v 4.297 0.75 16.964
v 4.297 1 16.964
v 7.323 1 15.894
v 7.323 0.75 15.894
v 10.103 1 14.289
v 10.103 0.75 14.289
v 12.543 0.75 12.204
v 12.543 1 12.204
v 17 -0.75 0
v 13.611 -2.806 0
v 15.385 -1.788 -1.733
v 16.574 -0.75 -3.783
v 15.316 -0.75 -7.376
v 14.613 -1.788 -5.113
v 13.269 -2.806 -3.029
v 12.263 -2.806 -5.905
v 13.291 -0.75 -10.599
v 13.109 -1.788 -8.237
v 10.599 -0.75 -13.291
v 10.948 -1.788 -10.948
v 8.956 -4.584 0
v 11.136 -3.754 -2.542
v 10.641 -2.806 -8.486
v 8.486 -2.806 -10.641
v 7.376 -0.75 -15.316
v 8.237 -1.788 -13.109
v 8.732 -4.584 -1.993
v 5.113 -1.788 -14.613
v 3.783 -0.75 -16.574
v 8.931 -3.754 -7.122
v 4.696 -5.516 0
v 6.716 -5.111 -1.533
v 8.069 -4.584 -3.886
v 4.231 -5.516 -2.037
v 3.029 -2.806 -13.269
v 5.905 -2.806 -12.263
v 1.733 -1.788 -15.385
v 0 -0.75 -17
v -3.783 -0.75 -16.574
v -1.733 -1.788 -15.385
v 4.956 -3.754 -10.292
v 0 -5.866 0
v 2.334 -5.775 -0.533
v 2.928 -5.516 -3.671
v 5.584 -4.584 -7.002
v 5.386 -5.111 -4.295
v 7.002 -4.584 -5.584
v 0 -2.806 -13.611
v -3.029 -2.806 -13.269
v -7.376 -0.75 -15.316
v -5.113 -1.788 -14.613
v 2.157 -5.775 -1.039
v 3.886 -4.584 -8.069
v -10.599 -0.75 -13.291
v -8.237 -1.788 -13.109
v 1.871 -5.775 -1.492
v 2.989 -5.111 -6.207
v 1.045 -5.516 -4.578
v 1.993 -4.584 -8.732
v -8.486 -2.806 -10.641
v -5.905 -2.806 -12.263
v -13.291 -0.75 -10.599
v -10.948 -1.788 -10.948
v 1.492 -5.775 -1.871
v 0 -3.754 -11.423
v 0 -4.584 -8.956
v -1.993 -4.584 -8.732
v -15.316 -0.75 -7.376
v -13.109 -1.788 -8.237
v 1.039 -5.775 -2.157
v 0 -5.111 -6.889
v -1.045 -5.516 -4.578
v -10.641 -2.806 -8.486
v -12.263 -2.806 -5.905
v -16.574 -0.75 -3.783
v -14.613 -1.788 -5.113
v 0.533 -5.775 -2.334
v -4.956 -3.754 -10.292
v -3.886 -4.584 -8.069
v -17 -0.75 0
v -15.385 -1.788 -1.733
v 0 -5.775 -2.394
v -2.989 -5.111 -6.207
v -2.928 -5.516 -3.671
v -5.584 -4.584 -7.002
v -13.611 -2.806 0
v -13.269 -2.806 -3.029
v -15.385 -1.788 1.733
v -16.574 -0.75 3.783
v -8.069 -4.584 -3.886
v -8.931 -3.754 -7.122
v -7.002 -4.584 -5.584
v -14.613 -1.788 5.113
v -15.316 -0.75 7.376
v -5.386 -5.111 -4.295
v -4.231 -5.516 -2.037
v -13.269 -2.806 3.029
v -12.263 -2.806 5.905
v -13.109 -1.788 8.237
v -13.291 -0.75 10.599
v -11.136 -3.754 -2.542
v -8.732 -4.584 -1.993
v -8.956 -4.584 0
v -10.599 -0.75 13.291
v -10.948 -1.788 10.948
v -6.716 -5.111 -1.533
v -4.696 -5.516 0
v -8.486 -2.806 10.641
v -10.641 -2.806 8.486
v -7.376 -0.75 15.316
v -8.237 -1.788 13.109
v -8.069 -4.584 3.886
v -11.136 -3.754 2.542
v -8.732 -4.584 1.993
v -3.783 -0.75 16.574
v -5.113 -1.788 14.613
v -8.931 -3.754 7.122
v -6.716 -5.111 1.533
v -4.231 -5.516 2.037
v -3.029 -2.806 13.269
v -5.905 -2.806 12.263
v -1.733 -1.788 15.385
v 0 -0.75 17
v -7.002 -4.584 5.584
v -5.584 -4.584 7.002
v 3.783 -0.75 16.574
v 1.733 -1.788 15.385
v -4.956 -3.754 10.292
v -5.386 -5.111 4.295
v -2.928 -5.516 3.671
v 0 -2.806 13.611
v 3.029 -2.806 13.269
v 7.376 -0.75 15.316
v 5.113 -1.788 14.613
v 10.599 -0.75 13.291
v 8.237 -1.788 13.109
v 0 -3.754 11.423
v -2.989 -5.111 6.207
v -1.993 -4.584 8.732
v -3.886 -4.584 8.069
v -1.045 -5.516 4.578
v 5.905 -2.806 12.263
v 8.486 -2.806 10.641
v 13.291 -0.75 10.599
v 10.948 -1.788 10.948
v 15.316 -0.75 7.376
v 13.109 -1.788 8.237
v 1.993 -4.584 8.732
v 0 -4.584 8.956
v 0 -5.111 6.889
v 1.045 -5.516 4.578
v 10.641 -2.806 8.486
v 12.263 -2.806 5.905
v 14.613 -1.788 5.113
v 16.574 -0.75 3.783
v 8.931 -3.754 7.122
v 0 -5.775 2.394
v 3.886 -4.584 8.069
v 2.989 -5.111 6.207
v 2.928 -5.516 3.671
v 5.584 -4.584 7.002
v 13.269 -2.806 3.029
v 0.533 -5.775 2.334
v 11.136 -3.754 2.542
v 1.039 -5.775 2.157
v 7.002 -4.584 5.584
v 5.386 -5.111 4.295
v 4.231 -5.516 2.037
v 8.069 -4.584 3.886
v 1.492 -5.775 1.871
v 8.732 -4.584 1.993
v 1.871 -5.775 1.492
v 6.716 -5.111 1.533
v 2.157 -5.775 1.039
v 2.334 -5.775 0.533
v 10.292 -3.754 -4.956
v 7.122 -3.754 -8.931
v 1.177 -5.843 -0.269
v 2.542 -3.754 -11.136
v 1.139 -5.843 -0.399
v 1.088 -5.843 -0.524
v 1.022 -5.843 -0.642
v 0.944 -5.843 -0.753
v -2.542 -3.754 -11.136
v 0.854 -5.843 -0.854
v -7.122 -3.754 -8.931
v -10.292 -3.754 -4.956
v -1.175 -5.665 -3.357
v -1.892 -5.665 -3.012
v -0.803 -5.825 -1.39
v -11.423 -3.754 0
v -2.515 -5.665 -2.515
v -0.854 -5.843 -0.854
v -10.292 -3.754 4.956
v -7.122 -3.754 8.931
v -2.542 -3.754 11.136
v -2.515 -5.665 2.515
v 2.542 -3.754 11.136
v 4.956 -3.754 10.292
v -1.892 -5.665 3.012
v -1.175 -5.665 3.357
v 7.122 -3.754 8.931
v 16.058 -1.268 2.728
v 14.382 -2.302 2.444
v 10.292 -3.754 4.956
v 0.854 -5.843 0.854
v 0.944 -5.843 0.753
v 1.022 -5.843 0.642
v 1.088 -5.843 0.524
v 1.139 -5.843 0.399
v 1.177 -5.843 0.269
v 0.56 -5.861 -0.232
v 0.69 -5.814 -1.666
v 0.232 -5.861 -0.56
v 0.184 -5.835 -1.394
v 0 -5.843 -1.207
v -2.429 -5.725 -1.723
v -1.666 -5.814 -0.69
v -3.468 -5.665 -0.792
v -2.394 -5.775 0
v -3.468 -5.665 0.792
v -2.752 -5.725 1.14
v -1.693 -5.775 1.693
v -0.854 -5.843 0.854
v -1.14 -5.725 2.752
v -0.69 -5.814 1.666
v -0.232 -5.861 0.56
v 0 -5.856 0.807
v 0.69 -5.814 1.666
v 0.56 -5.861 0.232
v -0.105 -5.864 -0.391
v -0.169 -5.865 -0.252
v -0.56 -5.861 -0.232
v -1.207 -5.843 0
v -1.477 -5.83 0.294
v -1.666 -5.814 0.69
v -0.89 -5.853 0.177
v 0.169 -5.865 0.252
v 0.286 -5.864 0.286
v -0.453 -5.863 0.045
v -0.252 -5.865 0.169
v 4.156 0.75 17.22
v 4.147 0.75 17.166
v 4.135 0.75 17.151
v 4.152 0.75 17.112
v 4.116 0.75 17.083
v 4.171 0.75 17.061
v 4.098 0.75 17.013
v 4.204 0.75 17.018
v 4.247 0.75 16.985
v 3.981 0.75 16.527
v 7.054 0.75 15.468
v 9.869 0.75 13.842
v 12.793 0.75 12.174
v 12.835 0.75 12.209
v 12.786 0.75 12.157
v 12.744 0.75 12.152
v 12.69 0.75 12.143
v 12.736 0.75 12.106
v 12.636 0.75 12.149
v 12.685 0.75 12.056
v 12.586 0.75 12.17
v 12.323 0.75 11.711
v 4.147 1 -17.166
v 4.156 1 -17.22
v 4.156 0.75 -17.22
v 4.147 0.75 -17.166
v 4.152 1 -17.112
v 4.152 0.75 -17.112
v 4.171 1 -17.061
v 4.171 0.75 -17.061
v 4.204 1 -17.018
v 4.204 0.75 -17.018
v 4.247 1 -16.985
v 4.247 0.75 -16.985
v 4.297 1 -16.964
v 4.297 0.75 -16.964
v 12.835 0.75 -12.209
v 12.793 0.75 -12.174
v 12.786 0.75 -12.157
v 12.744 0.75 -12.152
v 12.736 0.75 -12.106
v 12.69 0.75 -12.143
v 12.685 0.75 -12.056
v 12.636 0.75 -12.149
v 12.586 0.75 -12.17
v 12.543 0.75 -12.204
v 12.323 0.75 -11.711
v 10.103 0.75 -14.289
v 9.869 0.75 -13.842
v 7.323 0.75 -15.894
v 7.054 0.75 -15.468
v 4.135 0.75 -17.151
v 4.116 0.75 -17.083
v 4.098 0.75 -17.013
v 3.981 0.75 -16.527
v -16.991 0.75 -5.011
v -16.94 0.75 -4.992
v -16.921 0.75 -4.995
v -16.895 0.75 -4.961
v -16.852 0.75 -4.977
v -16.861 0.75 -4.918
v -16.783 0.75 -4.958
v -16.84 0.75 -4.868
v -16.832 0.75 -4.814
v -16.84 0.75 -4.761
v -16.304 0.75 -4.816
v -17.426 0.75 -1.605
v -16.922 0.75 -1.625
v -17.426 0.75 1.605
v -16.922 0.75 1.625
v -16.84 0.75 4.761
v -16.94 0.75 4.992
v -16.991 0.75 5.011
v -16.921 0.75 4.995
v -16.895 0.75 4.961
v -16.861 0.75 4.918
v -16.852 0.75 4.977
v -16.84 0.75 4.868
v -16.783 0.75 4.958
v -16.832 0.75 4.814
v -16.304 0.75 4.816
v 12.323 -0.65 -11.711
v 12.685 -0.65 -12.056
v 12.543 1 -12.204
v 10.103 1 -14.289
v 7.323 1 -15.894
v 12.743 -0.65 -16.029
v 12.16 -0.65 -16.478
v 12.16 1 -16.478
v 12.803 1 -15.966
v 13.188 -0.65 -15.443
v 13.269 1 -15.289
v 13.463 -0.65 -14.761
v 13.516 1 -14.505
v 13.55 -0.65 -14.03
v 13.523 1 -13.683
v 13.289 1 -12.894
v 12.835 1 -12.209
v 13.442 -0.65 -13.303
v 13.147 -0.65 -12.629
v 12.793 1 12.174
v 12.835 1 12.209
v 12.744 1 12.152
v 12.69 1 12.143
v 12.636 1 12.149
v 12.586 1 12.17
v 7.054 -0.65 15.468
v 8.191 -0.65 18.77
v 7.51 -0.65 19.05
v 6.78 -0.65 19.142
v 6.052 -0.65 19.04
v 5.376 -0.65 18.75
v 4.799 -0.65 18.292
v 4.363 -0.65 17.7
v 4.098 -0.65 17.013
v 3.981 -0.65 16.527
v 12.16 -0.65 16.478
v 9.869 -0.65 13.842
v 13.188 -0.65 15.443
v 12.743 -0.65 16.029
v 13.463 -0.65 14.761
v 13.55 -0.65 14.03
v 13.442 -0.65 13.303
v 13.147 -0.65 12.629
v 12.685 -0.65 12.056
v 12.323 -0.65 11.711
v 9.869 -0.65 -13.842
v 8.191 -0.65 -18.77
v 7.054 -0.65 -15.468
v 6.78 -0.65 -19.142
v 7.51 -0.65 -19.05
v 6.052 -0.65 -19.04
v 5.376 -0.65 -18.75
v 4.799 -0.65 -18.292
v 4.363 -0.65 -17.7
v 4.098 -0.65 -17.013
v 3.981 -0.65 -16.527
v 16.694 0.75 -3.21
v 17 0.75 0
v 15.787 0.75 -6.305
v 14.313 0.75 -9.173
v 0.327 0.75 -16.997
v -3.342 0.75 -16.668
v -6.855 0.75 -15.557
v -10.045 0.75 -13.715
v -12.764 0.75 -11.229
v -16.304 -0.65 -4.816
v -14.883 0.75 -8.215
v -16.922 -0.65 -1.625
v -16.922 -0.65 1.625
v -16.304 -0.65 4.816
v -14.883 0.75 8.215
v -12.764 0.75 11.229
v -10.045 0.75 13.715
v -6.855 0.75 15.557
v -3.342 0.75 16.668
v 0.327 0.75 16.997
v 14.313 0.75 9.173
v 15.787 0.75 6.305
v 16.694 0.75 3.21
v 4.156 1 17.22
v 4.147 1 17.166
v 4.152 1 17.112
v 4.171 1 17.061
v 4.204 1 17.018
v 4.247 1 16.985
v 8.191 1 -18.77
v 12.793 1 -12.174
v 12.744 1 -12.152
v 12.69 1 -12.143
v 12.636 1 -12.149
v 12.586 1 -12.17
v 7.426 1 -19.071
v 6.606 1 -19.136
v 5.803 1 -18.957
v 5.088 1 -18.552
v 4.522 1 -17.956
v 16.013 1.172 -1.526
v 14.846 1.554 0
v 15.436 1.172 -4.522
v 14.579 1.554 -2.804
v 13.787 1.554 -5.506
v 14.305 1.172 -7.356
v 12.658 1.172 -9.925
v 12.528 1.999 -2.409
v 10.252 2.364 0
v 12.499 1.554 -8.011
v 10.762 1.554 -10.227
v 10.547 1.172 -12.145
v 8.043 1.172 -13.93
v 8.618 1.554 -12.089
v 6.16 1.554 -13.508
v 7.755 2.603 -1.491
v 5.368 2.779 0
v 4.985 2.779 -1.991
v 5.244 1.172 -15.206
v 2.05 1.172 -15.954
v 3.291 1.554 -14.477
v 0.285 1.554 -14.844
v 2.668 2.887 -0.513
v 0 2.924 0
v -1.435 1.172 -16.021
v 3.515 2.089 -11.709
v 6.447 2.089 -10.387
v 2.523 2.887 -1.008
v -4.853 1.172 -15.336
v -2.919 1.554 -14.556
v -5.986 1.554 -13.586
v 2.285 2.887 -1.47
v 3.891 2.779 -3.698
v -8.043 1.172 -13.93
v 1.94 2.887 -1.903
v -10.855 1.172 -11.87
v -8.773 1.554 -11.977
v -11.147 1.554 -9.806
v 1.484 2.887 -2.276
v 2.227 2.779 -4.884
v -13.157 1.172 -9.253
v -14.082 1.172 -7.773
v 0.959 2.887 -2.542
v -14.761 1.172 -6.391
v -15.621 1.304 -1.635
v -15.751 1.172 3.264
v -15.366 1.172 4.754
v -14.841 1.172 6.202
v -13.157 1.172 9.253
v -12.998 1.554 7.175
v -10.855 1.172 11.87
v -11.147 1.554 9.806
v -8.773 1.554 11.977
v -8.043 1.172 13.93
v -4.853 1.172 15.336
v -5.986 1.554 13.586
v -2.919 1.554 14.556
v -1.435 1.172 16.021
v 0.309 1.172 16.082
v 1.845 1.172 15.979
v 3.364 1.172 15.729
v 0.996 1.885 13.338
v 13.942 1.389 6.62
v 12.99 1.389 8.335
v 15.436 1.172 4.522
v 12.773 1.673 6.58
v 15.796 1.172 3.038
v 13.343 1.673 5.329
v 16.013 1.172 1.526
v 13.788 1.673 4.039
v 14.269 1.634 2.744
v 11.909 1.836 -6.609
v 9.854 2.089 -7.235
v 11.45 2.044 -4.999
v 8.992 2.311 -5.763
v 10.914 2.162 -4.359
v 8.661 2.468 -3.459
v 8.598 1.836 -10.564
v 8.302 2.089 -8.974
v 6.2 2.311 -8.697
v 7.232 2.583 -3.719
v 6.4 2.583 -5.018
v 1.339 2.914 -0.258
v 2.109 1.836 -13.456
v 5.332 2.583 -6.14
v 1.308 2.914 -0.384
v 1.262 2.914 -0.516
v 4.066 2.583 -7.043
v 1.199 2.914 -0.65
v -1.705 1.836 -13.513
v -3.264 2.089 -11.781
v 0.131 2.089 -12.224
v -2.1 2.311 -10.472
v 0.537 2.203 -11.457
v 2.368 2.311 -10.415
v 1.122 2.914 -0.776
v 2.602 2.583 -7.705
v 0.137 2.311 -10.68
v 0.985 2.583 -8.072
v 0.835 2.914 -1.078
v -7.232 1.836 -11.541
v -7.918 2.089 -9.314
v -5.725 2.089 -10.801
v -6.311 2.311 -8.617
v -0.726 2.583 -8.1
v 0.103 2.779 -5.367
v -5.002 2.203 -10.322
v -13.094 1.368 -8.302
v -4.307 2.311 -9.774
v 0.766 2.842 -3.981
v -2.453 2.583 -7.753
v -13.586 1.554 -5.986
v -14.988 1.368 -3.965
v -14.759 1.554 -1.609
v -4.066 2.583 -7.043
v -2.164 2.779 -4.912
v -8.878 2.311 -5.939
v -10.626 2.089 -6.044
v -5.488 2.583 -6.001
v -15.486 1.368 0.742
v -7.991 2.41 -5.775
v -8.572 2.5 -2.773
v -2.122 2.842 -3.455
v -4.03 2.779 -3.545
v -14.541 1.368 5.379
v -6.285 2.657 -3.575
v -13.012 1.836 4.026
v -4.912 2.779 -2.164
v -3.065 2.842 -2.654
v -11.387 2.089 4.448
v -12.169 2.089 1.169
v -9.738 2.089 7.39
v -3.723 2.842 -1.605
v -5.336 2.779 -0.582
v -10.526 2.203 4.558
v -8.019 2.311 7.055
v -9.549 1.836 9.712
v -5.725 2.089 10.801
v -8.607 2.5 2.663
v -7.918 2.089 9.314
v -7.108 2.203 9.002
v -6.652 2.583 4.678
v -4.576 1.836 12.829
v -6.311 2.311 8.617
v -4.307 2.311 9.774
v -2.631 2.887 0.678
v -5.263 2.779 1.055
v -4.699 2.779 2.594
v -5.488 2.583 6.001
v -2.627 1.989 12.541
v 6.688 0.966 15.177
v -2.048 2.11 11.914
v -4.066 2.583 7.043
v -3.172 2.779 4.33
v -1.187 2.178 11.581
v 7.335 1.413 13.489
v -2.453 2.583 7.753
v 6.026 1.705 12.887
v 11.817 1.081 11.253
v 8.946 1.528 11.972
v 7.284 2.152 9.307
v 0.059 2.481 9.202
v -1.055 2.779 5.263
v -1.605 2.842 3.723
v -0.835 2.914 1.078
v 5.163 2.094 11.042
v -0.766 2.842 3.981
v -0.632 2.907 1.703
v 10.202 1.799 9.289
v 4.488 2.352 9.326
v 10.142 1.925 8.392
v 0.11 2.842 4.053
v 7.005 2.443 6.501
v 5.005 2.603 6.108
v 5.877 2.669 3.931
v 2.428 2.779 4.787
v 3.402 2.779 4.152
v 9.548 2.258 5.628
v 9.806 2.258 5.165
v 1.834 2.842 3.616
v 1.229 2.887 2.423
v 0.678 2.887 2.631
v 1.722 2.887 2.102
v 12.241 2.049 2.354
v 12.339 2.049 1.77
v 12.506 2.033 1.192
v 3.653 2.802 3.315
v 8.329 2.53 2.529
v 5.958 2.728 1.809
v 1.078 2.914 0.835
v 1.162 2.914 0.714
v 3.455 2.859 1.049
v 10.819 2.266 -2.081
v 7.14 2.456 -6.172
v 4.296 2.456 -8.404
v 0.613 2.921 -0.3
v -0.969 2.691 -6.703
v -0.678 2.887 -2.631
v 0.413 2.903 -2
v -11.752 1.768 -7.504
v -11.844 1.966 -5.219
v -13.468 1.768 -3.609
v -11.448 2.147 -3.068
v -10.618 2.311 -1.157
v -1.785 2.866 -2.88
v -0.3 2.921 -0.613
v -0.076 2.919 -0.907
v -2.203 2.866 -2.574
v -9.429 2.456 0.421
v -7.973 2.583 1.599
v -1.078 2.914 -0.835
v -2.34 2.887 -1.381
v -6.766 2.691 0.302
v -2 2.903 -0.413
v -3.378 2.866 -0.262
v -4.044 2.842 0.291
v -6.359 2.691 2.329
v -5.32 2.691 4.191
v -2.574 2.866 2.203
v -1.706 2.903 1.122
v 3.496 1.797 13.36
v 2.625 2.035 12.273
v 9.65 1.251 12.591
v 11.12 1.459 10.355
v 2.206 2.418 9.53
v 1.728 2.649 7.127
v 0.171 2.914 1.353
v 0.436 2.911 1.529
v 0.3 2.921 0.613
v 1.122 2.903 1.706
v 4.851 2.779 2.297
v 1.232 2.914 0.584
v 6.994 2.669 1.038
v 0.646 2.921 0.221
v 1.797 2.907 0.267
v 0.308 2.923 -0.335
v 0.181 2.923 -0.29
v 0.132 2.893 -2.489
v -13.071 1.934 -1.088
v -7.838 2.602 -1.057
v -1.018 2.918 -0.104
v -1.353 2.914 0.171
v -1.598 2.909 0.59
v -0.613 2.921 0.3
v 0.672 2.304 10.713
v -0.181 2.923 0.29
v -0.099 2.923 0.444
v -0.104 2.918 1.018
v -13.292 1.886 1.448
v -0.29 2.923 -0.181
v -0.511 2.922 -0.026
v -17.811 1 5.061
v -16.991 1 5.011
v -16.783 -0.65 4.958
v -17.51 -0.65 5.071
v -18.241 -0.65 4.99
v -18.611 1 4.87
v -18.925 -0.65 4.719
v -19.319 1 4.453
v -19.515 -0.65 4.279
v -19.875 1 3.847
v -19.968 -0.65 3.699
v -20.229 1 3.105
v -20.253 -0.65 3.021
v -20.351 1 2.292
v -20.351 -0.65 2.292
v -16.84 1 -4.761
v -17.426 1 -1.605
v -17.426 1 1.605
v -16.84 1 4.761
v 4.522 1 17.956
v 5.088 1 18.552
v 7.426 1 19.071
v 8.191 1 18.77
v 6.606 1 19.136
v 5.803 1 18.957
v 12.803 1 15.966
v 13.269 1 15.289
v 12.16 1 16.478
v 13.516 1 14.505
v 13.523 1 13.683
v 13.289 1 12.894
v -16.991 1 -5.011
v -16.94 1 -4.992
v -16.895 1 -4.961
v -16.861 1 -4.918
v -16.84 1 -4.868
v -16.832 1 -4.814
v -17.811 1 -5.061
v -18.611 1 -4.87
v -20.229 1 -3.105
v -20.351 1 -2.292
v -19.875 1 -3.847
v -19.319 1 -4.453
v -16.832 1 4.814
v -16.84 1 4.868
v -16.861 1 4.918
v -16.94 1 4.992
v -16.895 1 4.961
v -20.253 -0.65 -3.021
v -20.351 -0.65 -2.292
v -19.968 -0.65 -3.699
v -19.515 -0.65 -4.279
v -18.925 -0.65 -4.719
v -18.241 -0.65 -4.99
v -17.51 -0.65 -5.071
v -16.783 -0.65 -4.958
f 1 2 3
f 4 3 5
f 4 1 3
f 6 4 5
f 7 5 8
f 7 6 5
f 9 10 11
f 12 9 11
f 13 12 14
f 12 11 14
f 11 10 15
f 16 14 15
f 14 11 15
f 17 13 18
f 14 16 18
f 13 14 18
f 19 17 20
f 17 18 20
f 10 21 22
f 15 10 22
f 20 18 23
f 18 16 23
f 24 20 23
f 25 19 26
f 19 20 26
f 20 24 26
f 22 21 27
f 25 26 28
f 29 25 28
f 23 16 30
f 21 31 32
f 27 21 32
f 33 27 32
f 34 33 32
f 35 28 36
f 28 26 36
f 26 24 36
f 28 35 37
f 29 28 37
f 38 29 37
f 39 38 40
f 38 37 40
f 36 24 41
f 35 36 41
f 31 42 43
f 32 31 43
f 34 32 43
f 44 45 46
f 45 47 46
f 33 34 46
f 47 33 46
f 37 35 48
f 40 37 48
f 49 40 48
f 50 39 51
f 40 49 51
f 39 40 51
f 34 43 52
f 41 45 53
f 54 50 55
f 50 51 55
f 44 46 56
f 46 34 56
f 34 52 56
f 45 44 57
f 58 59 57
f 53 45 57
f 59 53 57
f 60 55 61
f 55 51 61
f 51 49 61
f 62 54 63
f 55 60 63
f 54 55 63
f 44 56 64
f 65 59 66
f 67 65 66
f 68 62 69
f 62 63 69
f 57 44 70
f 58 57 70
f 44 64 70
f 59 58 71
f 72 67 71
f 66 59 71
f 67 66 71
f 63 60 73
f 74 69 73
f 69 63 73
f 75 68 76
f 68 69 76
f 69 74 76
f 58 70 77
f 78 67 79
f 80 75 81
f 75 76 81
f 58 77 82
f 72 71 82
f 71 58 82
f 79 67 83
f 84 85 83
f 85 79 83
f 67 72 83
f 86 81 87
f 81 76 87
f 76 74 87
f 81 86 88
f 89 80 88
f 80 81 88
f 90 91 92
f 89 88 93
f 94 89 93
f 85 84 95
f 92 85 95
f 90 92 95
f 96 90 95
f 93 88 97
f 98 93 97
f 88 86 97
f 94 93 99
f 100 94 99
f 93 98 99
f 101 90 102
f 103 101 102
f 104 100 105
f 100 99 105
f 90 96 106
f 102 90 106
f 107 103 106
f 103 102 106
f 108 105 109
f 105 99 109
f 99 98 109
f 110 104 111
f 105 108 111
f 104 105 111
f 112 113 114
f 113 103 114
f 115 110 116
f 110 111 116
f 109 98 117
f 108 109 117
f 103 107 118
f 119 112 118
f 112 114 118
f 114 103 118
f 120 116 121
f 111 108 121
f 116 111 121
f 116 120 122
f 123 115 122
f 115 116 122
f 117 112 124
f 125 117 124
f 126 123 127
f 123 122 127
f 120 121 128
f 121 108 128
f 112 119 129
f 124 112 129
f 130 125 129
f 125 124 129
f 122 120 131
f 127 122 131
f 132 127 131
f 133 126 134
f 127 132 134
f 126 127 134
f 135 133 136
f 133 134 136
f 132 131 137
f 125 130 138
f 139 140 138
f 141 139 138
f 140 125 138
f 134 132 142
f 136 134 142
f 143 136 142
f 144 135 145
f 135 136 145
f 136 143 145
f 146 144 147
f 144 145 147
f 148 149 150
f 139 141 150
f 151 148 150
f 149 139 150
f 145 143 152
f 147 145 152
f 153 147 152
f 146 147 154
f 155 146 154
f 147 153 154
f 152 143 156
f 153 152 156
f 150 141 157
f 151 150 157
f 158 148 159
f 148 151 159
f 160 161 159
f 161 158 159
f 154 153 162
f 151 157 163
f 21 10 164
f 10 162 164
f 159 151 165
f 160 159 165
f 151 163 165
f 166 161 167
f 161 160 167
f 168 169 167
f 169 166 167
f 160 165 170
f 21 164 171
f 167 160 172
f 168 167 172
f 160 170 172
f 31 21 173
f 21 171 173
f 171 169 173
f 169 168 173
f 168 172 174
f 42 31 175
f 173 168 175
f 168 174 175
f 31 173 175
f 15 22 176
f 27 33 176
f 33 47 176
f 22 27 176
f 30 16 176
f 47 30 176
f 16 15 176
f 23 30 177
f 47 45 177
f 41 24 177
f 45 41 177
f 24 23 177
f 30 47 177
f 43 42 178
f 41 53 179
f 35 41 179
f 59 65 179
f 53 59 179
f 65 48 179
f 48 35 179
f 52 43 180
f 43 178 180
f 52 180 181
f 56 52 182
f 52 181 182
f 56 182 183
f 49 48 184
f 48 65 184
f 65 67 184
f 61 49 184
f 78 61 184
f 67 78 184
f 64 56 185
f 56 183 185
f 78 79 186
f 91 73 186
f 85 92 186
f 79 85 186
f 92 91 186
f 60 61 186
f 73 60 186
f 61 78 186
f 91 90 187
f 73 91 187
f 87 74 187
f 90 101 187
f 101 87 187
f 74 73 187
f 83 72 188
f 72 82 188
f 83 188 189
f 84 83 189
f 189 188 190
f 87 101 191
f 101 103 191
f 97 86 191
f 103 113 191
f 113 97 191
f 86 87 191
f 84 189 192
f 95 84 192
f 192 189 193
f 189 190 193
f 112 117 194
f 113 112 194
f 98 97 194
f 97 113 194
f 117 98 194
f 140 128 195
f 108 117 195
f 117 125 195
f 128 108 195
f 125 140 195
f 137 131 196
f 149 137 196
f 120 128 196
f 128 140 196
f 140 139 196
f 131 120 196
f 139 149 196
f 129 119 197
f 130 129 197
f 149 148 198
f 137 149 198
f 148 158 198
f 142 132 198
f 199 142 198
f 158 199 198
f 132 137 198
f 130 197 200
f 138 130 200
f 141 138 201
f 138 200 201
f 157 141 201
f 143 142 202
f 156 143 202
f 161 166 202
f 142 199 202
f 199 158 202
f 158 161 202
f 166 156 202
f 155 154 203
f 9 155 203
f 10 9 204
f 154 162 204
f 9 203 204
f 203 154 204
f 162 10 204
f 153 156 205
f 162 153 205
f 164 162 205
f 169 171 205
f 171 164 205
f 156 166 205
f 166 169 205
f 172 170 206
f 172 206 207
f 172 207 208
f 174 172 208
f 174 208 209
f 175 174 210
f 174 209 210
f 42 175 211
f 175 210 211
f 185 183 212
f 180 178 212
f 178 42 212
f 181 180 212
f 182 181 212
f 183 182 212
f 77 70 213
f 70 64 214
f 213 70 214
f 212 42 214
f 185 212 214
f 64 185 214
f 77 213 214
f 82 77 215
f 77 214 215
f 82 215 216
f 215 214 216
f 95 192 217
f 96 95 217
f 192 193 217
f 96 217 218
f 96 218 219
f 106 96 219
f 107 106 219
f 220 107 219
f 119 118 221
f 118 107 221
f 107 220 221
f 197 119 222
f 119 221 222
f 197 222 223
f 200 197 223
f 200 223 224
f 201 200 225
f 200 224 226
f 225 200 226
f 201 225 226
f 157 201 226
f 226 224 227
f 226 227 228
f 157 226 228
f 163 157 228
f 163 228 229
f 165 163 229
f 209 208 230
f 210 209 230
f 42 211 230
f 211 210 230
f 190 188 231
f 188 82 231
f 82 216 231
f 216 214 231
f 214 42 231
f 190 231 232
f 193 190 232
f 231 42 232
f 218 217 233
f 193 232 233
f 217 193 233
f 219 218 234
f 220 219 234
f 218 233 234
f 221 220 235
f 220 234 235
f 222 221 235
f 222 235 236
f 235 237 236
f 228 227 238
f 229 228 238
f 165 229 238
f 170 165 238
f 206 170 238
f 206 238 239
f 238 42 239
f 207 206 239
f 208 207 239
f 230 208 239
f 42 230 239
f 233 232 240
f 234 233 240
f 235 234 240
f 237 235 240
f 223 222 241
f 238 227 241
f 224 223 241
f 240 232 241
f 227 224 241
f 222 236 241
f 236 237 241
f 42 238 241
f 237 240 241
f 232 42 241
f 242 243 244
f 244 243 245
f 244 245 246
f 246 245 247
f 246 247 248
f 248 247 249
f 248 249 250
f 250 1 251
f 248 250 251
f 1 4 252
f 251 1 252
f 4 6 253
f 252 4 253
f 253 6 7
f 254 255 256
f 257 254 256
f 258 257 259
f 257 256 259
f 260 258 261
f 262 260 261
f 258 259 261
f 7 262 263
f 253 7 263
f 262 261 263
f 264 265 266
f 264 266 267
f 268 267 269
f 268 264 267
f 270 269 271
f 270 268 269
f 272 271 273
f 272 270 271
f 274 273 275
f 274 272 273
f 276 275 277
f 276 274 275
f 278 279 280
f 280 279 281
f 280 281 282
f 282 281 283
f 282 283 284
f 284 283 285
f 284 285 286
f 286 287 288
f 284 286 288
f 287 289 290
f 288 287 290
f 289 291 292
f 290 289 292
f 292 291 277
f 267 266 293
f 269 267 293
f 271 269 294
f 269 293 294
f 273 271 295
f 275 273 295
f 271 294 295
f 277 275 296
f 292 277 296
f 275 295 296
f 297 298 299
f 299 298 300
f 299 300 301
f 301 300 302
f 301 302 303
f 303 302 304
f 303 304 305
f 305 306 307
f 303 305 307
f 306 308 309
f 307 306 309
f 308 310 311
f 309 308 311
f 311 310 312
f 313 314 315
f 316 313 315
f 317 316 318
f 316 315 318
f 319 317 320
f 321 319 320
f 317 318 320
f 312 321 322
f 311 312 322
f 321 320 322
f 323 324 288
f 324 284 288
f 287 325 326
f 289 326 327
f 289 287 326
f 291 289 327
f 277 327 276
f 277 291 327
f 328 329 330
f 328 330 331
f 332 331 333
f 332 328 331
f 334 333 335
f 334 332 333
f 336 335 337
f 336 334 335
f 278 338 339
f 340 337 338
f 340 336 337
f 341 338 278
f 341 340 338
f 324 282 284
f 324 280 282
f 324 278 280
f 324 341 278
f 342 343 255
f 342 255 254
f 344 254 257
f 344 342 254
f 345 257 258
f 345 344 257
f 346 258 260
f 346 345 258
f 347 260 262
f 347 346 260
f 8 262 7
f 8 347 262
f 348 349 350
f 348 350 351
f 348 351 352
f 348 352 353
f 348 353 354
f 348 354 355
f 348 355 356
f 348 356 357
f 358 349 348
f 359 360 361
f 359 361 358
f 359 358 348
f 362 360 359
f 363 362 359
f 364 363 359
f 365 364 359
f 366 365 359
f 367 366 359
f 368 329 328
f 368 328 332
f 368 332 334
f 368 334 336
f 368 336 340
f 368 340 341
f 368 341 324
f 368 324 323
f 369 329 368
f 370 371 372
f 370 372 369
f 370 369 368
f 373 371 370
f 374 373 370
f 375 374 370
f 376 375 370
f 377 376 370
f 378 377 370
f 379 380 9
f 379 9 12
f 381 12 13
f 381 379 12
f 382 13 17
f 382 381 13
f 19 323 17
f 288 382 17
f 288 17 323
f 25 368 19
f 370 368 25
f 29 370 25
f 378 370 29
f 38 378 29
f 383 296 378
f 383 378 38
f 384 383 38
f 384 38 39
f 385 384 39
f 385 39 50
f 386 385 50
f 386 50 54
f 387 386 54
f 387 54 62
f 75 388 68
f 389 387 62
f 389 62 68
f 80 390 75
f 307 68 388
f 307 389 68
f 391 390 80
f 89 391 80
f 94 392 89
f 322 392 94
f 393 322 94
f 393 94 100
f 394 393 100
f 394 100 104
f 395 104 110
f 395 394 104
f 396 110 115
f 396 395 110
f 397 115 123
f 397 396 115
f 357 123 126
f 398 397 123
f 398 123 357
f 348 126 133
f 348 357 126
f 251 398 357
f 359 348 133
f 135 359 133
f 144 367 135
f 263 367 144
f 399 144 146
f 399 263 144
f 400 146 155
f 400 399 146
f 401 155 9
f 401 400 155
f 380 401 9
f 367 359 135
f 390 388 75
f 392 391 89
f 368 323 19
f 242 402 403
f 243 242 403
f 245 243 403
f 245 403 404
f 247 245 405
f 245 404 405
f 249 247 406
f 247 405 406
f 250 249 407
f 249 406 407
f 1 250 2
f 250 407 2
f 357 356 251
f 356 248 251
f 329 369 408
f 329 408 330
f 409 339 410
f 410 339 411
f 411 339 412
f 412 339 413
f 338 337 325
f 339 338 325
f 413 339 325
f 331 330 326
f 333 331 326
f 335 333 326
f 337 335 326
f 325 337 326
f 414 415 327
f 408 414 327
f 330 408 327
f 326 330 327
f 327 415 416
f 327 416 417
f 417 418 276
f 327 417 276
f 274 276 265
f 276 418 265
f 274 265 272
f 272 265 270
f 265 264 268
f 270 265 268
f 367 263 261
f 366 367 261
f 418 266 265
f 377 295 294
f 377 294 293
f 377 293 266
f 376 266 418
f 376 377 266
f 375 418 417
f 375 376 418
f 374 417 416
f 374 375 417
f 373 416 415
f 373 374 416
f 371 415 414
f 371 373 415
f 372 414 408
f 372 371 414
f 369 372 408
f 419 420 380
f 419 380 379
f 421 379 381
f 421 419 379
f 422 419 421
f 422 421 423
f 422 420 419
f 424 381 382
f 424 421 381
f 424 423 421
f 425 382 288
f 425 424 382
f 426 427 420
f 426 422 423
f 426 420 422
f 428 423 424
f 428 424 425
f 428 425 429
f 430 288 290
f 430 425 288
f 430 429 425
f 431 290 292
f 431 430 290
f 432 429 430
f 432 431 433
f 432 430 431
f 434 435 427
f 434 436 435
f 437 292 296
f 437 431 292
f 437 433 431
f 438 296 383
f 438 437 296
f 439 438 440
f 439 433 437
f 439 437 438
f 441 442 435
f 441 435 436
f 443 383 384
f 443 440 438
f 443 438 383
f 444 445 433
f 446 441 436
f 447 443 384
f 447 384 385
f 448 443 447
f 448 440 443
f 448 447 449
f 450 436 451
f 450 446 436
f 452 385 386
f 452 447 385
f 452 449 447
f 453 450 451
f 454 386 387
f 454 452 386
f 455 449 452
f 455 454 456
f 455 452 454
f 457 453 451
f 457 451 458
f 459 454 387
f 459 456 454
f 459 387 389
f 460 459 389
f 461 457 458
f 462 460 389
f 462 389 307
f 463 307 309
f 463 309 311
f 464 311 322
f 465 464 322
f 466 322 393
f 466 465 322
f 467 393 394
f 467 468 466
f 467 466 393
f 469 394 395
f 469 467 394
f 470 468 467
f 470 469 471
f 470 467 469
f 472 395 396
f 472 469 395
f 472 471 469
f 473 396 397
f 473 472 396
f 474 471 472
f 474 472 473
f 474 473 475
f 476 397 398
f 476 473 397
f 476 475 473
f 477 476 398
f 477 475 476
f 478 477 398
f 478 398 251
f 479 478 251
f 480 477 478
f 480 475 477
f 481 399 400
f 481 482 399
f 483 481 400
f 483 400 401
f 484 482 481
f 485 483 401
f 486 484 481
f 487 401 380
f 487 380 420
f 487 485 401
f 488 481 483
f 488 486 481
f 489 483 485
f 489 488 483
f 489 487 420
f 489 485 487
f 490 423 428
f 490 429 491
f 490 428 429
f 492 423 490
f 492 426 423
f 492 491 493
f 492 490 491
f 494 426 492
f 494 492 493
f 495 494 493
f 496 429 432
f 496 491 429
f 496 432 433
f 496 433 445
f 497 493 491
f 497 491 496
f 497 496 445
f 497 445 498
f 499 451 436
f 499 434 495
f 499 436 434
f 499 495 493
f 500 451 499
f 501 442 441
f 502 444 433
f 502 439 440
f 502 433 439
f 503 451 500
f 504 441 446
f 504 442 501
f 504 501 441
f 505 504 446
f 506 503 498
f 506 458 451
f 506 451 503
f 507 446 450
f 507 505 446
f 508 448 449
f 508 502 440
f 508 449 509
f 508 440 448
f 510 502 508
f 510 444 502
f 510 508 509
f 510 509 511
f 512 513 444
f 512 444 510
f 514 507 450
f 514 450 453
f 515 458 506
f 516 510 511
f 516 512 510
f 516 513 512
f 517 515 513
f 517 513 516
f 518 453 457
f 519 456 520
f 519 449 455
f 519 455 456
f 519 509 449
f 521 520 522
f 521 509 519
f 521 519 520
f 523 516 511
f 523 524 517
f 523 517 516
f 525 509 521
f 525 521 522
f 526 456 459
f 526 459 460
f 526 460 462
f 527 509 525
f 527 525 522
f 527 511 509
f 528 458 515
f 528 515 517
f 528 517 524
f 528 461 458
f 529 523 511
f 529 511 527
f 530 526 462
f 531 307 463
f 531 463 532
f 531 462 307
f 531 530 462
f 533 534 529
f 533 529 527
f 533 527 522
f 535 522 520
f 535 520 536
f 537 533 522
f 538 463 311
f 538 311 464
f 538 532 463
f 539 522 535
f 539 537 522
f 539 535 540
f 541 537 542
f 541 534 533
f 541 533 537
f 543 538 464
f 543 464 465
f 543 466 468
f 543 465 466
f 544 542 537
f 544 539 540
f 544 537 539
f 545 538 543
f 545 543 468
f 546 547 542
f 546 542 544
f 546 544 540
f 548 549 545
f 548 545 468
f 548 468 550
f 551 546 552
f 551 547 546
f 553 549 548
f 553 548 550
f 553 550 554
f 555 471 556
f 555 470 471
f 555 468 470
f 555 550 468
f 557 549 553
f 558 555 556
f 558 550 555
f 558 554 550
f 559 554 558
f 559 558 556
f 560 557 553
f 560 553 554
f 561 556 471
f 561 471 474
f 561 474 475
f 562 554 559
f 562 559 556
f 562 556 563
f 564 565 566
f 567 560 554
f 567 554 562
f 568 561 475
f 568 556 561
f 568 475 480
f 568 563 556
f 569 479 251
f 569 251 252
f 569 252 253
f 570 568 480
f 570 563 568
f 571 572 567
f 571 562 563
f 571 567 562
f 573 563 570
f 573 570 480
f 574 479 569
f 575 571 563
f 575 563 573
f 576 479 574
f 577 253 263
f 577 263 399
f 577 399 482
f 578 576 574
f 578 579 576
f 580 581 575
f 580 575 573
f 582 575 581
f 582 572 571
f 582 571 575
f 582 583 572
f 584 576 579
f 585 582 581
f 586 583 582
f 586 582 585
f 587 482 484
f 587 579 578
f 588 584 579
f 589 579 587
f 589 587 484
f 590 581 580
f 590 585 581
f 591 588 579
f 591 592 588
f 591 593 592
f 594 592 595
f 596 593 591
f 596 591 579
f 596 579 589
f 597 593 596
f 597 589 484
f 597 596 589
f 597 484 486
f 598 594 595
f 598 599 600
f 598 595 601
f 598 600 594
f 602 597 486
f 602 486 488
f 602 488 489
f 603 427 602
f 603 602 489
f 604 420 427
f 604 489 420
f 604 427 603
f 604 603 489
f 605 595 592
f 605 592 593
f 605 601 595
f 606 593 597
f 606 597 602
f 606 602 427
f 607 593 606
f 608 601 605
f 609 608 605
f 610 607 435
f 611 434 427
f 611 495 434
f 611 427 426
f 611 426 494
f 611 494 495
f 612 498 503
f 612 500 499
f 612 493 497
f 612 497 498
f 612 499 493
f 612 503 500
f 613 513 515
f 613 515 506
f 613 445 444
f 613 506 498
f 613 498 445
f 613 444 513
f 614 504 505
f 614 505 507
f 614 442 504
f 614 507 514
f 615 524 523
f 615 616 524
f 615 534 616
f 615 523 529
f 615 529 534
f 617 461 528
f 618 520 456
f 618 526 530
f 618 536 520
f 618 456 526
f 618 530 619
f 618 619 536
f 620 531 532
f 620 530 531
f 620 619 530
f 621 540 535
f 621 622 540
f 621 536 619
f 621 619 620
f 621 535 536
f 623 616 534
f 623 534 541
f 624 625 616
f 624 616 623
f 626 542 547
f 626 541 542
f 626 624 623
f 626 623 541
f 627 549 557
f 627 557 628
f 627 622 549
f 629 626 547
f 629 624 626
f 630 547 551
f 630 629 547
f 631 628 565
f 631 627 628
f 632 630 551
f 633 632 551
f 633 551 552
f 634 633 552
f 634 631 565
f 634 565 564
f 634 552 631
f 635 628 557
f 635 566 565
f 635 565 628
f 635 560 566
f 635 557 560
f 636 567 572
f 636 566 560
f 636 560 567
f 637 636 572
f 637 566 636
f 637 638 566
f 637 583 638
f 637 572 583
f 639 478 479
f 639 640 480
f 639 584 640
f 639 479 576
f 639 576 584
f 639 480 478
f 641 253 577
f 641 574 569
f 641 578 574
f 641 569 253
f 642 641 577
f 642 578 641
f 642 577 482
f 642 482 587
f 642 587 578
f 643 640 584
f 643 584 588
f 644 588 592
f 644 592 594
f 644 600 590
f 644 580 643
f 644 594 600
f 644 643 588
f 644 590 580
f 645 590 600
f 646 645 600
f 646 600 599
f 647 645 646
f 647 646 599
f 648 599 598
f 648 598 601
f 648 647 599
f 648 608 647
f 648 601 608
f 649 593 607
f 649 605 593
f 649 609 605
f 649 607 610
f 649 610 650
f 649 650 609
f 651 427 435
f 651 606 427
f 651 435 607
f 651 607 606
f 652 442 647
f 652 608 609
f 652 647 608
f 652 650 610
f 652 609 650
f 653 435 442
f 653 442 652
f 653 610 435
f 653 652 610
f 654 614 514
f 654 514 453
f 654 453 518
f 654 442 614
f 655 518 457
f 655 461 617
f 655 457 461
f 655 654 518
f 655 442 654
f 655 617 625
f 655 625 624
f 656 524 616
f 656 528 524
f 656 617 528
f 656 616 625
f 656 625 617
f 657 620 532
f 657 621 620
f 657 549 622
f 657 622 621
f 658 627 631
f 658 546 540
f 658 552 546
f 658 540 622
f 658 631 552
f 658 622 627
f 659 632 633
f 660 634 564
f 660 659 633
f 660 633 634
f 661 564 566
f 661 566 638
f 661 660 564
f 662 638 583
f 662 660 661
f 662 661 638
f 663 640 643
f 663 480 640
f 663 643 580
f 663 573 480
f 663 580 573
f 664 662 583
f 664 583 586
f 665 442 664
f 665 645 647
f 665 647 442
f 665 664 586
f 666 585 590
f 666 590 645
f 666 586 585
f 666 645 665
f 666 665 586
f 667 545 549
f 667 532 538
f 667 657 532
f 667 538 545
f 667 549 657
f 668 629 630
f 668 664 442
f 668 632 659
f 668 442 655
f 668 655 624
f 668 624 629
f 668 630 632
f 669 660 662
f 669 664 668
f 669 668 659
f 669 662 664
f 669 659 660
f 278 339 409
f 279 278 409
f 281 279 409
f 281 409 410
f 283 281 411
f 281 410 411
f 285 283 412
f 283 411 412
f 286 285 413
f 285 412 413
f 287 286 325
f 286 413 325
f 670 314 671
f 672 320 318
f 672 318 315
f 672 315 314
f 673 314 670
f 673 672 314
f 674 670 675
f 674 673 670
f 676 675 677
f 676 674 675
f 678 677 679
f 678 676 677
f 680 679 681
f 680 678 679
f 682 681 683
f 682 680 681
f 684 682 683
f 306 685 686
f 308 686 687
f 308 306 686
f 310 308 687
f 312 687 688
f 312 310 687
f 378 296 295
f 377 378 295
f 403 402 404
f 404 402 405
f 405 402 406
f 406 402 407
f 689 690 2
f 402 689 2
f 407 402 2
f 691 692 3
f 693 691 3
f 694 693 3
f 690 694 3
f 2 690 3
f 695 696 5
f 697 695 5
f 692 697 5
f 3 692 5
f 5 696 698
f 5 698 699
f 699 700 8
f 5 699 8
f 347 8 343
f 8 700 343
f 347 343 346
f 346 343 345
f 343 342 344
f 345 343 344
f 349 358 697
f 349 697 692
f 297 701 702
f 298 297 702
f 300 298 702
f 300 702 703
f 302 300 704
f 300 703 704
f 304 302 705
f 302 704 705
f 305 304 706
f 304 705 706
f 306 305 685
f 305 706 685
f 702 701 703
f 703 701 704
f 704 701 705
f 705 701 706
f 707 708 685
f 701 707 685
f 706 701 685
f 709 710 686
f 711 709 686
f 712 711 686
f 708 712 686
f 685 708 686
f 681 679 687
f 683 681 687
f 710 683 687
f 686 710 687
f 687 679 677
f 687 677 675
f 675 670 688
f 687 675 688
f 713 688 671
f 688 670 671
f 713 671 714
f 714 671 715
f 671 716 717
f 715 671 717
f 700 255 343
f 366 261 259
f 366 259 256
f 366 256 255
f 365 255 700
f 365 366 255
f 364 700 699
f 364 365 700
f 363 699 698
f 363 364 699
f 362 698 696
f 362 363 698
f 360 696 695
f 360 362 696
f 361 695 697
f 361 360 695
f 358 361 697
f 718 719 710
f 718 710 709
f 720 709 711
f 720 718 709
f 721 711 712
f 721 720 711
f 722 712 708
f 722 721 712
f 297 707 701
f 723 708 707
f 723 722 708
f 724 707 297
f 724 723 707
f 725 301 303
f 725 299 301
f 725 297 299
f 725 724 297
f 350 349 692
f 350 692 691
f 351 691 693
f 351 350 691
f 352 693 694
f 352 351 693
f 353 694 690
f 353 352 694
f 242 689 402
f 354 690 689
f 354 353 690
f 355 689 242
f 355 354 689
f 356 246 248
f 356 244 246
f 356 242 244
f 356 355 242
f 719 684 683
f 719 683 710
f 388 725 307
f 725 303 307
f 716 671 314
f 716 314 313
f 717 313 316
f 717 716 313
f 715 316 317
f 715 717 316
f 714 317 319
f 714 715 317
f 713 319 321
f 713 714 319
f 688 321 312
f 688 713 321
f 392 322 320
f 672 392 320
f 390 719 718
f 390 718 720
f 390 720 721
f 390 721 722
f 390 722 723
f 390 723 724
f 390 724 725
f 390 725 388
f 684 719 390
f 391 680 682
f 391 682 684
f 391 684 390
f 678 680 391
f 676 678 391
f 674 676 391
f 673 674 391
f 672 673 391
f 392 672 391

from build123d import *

# Parameters (mm, degrees)
F0_W          = 17
F0_H          = 1.5
F3_DEPTH      = 0.75
F3_DEPTH_BACK = 0.65
F4_DEPTH      = 1
F5_T1_DEPTH   = 0.7858762015
F6_COUNT      = 3
F6_ANGLE      = 240


# Not quite as in the source:
# - a fillet or chamfer that OpenCascade refuses, or shapes differently, is made with other operations: its cross-section is extruded or revolved along the edge and cut away or added
# - a feature names something its author has since deleted; it is built from what else it names


with BuildPart() as f1:
    # F0 (on Top) → F1 (revolve)
    with BuildSketch(Plane.XY):
        with BuildLine():
            Line((0, 2.9235986368), (0, 0.75))
            Line((0, 0.75), (17, 0.75))
            add(Edge.make_bspline(
                [(17, 0.75), (14.7452850491, 2.0917814691), (7.445672527, 2.9235986368), (0, 2.9235986368)],
                knots=[0, 0, 0, 0, 17.1383934788, 17.1383934788, 17.1383934788, 17.1383934788], degree=3))
        make_face()
        with Locations((8.5, 0)):
            Rectangle(F0_W, F0_H)
        with BuildLine():
            Line((17, -0.75), (0, -0.75))
            Line((0, -0.75), (0, -5.8664013632))
            add(Edge.make_bspline(
                [(17, -0.75), (13.8637118638, -3.1852589455), (7.4548930861, -5.8664013632), (0, -5.8664013632)],
                knots=[0, 0, 0, 0, 17.7532409128, 17.7532409128, 17.7532409128, 17.7532409128], degree=3))
        make_face()
    revolve(axis=Axis((0, 1.8367993184, 0), (0, 1, 0)))

    # F2 (on Front) → F3 (join, two sides)
    with BuildSketch(Plane.XZ) as f3_sk:
        with BuildLine():
            ThreePointArc((-16.7830230255, -4.9578360326), (-17.5, 0), (-16.7830230255, 4.9578360326))
            ThreePointArc((-16.7830230255, 4.9578360326), (-19.2347780947, 4.5186022412), (-20.3506106924, 2.2917329463))
            Line((-20.3506106924, 2.2917329463), (-20.3506106924, 0))
            Line((-20.3506106924, 0), (-20.3506106924, -2.2917329463))
            ThreePointArc((-20.3506106924, -2.2917329463), (-19.2347780947, -4.5186022412), (-16.7830230255, -4.9578360326))
        make_face()
        with BuildLine():
            ThreePointArc((-16.3035080819, -4.8161835745), (-17, 0), (-16.3035080819, 4.8161835745))
            Line((-16.3035080819, 4.8161835745), (-16.7830230255, 4.9578360326))
            ThreePointArc((-16.7830230255, 4.9578360326), (-17.5, 0), (-16.7830230255, -4.9578360326))
            Line((-16.7830230255, -4.9578360326), (-16.3035080819, -4.8161835745))
        make_face()
    extrude(amount=-F3_DEPTH)
    extrude(f3_sk.sketch, amount=F3_DEPTH_BACK)

    # F2 (on Front) → F4 (join)
    with BuildSketch(Plane.XZ):
        with BuildLine():
            ThreePointArc((-16.7830230255, -4.9578360326), (-17.5, 0), (-16.7830230255, 4.9578360326))
            ThreePointArc((-16.7830230255, 4.9578360326), (-19.2347780947, 4.5186022412), (-20.3506106924, 2.2917329463))
            Line((-20.3506106924, 2.2917329463), (-20.3506106924, 0))
            Line((-20.3506106924, 0), (-20.3506106924, -2.2917329463))
            ThreePointArc((-20.3506106924, -2.2917329463), (-19.2347780947, -4.5186022412), (-16.7830230255, -4.9578360326))
        make_face()
    extrude(amount=-F4_DEPTH)

    # F5: fillet of radius 0.2 on 2 edges, made by hand

    # F5_s2 → F5_t1 (cut)
    with BuildSketch(Plane.XZ.offset(-1.5358762015)):
        with BuildLine():
            ThreePointArc((-16.9907798648, -5.0105923048), (-16.8612192668, -4.9182617144), (-16.84003675, -4.7605842351))
            ThreePointArc((-16.84003675, -4.7605842351), (-16.8118191828, -4.8592937518), (-16.7830230255, -4.9578360326))
            ThreePointArc((-16.7830230255, -4.9578360326), (-16.8863927879, -4.9862172864), (-16.9907798648, -5.0105923048))
        make_face()
        with BuildLine():
            ThreePointArc((-16.9907798648, 5.0105923048), (-16.8612192668, 4.9182617144), (-16.84003675, 4.7605842351))
            ThreePointArc((-16.84003675, 4.7605842351), (-16.8118191828, 4.8592937518), (-16.7830230255, 4.9578360326))
            ThreePointArc((-16.7830230255, 4.9578360326), (-16.8863927879, 4.9862172864), (-16.9907798648, 5.0105923048))
        make_face()
    extrude(amount=F5_T1_DEPTH, mode=Mode.SUBTRACT)

    # F6: F1 ×3 about axis
    f6_axis = Axis((0, -3.3082006816, 0), (0, -1, 0))


with BuildPart() as f1_1:
    add(f1.part)
    for i in range(1, F6_COUNT):
        add(f1.part.rotate(f6_axis, i * F6_ANGLE / (F6_COUNT - 1)))


solid = f1_1.part
